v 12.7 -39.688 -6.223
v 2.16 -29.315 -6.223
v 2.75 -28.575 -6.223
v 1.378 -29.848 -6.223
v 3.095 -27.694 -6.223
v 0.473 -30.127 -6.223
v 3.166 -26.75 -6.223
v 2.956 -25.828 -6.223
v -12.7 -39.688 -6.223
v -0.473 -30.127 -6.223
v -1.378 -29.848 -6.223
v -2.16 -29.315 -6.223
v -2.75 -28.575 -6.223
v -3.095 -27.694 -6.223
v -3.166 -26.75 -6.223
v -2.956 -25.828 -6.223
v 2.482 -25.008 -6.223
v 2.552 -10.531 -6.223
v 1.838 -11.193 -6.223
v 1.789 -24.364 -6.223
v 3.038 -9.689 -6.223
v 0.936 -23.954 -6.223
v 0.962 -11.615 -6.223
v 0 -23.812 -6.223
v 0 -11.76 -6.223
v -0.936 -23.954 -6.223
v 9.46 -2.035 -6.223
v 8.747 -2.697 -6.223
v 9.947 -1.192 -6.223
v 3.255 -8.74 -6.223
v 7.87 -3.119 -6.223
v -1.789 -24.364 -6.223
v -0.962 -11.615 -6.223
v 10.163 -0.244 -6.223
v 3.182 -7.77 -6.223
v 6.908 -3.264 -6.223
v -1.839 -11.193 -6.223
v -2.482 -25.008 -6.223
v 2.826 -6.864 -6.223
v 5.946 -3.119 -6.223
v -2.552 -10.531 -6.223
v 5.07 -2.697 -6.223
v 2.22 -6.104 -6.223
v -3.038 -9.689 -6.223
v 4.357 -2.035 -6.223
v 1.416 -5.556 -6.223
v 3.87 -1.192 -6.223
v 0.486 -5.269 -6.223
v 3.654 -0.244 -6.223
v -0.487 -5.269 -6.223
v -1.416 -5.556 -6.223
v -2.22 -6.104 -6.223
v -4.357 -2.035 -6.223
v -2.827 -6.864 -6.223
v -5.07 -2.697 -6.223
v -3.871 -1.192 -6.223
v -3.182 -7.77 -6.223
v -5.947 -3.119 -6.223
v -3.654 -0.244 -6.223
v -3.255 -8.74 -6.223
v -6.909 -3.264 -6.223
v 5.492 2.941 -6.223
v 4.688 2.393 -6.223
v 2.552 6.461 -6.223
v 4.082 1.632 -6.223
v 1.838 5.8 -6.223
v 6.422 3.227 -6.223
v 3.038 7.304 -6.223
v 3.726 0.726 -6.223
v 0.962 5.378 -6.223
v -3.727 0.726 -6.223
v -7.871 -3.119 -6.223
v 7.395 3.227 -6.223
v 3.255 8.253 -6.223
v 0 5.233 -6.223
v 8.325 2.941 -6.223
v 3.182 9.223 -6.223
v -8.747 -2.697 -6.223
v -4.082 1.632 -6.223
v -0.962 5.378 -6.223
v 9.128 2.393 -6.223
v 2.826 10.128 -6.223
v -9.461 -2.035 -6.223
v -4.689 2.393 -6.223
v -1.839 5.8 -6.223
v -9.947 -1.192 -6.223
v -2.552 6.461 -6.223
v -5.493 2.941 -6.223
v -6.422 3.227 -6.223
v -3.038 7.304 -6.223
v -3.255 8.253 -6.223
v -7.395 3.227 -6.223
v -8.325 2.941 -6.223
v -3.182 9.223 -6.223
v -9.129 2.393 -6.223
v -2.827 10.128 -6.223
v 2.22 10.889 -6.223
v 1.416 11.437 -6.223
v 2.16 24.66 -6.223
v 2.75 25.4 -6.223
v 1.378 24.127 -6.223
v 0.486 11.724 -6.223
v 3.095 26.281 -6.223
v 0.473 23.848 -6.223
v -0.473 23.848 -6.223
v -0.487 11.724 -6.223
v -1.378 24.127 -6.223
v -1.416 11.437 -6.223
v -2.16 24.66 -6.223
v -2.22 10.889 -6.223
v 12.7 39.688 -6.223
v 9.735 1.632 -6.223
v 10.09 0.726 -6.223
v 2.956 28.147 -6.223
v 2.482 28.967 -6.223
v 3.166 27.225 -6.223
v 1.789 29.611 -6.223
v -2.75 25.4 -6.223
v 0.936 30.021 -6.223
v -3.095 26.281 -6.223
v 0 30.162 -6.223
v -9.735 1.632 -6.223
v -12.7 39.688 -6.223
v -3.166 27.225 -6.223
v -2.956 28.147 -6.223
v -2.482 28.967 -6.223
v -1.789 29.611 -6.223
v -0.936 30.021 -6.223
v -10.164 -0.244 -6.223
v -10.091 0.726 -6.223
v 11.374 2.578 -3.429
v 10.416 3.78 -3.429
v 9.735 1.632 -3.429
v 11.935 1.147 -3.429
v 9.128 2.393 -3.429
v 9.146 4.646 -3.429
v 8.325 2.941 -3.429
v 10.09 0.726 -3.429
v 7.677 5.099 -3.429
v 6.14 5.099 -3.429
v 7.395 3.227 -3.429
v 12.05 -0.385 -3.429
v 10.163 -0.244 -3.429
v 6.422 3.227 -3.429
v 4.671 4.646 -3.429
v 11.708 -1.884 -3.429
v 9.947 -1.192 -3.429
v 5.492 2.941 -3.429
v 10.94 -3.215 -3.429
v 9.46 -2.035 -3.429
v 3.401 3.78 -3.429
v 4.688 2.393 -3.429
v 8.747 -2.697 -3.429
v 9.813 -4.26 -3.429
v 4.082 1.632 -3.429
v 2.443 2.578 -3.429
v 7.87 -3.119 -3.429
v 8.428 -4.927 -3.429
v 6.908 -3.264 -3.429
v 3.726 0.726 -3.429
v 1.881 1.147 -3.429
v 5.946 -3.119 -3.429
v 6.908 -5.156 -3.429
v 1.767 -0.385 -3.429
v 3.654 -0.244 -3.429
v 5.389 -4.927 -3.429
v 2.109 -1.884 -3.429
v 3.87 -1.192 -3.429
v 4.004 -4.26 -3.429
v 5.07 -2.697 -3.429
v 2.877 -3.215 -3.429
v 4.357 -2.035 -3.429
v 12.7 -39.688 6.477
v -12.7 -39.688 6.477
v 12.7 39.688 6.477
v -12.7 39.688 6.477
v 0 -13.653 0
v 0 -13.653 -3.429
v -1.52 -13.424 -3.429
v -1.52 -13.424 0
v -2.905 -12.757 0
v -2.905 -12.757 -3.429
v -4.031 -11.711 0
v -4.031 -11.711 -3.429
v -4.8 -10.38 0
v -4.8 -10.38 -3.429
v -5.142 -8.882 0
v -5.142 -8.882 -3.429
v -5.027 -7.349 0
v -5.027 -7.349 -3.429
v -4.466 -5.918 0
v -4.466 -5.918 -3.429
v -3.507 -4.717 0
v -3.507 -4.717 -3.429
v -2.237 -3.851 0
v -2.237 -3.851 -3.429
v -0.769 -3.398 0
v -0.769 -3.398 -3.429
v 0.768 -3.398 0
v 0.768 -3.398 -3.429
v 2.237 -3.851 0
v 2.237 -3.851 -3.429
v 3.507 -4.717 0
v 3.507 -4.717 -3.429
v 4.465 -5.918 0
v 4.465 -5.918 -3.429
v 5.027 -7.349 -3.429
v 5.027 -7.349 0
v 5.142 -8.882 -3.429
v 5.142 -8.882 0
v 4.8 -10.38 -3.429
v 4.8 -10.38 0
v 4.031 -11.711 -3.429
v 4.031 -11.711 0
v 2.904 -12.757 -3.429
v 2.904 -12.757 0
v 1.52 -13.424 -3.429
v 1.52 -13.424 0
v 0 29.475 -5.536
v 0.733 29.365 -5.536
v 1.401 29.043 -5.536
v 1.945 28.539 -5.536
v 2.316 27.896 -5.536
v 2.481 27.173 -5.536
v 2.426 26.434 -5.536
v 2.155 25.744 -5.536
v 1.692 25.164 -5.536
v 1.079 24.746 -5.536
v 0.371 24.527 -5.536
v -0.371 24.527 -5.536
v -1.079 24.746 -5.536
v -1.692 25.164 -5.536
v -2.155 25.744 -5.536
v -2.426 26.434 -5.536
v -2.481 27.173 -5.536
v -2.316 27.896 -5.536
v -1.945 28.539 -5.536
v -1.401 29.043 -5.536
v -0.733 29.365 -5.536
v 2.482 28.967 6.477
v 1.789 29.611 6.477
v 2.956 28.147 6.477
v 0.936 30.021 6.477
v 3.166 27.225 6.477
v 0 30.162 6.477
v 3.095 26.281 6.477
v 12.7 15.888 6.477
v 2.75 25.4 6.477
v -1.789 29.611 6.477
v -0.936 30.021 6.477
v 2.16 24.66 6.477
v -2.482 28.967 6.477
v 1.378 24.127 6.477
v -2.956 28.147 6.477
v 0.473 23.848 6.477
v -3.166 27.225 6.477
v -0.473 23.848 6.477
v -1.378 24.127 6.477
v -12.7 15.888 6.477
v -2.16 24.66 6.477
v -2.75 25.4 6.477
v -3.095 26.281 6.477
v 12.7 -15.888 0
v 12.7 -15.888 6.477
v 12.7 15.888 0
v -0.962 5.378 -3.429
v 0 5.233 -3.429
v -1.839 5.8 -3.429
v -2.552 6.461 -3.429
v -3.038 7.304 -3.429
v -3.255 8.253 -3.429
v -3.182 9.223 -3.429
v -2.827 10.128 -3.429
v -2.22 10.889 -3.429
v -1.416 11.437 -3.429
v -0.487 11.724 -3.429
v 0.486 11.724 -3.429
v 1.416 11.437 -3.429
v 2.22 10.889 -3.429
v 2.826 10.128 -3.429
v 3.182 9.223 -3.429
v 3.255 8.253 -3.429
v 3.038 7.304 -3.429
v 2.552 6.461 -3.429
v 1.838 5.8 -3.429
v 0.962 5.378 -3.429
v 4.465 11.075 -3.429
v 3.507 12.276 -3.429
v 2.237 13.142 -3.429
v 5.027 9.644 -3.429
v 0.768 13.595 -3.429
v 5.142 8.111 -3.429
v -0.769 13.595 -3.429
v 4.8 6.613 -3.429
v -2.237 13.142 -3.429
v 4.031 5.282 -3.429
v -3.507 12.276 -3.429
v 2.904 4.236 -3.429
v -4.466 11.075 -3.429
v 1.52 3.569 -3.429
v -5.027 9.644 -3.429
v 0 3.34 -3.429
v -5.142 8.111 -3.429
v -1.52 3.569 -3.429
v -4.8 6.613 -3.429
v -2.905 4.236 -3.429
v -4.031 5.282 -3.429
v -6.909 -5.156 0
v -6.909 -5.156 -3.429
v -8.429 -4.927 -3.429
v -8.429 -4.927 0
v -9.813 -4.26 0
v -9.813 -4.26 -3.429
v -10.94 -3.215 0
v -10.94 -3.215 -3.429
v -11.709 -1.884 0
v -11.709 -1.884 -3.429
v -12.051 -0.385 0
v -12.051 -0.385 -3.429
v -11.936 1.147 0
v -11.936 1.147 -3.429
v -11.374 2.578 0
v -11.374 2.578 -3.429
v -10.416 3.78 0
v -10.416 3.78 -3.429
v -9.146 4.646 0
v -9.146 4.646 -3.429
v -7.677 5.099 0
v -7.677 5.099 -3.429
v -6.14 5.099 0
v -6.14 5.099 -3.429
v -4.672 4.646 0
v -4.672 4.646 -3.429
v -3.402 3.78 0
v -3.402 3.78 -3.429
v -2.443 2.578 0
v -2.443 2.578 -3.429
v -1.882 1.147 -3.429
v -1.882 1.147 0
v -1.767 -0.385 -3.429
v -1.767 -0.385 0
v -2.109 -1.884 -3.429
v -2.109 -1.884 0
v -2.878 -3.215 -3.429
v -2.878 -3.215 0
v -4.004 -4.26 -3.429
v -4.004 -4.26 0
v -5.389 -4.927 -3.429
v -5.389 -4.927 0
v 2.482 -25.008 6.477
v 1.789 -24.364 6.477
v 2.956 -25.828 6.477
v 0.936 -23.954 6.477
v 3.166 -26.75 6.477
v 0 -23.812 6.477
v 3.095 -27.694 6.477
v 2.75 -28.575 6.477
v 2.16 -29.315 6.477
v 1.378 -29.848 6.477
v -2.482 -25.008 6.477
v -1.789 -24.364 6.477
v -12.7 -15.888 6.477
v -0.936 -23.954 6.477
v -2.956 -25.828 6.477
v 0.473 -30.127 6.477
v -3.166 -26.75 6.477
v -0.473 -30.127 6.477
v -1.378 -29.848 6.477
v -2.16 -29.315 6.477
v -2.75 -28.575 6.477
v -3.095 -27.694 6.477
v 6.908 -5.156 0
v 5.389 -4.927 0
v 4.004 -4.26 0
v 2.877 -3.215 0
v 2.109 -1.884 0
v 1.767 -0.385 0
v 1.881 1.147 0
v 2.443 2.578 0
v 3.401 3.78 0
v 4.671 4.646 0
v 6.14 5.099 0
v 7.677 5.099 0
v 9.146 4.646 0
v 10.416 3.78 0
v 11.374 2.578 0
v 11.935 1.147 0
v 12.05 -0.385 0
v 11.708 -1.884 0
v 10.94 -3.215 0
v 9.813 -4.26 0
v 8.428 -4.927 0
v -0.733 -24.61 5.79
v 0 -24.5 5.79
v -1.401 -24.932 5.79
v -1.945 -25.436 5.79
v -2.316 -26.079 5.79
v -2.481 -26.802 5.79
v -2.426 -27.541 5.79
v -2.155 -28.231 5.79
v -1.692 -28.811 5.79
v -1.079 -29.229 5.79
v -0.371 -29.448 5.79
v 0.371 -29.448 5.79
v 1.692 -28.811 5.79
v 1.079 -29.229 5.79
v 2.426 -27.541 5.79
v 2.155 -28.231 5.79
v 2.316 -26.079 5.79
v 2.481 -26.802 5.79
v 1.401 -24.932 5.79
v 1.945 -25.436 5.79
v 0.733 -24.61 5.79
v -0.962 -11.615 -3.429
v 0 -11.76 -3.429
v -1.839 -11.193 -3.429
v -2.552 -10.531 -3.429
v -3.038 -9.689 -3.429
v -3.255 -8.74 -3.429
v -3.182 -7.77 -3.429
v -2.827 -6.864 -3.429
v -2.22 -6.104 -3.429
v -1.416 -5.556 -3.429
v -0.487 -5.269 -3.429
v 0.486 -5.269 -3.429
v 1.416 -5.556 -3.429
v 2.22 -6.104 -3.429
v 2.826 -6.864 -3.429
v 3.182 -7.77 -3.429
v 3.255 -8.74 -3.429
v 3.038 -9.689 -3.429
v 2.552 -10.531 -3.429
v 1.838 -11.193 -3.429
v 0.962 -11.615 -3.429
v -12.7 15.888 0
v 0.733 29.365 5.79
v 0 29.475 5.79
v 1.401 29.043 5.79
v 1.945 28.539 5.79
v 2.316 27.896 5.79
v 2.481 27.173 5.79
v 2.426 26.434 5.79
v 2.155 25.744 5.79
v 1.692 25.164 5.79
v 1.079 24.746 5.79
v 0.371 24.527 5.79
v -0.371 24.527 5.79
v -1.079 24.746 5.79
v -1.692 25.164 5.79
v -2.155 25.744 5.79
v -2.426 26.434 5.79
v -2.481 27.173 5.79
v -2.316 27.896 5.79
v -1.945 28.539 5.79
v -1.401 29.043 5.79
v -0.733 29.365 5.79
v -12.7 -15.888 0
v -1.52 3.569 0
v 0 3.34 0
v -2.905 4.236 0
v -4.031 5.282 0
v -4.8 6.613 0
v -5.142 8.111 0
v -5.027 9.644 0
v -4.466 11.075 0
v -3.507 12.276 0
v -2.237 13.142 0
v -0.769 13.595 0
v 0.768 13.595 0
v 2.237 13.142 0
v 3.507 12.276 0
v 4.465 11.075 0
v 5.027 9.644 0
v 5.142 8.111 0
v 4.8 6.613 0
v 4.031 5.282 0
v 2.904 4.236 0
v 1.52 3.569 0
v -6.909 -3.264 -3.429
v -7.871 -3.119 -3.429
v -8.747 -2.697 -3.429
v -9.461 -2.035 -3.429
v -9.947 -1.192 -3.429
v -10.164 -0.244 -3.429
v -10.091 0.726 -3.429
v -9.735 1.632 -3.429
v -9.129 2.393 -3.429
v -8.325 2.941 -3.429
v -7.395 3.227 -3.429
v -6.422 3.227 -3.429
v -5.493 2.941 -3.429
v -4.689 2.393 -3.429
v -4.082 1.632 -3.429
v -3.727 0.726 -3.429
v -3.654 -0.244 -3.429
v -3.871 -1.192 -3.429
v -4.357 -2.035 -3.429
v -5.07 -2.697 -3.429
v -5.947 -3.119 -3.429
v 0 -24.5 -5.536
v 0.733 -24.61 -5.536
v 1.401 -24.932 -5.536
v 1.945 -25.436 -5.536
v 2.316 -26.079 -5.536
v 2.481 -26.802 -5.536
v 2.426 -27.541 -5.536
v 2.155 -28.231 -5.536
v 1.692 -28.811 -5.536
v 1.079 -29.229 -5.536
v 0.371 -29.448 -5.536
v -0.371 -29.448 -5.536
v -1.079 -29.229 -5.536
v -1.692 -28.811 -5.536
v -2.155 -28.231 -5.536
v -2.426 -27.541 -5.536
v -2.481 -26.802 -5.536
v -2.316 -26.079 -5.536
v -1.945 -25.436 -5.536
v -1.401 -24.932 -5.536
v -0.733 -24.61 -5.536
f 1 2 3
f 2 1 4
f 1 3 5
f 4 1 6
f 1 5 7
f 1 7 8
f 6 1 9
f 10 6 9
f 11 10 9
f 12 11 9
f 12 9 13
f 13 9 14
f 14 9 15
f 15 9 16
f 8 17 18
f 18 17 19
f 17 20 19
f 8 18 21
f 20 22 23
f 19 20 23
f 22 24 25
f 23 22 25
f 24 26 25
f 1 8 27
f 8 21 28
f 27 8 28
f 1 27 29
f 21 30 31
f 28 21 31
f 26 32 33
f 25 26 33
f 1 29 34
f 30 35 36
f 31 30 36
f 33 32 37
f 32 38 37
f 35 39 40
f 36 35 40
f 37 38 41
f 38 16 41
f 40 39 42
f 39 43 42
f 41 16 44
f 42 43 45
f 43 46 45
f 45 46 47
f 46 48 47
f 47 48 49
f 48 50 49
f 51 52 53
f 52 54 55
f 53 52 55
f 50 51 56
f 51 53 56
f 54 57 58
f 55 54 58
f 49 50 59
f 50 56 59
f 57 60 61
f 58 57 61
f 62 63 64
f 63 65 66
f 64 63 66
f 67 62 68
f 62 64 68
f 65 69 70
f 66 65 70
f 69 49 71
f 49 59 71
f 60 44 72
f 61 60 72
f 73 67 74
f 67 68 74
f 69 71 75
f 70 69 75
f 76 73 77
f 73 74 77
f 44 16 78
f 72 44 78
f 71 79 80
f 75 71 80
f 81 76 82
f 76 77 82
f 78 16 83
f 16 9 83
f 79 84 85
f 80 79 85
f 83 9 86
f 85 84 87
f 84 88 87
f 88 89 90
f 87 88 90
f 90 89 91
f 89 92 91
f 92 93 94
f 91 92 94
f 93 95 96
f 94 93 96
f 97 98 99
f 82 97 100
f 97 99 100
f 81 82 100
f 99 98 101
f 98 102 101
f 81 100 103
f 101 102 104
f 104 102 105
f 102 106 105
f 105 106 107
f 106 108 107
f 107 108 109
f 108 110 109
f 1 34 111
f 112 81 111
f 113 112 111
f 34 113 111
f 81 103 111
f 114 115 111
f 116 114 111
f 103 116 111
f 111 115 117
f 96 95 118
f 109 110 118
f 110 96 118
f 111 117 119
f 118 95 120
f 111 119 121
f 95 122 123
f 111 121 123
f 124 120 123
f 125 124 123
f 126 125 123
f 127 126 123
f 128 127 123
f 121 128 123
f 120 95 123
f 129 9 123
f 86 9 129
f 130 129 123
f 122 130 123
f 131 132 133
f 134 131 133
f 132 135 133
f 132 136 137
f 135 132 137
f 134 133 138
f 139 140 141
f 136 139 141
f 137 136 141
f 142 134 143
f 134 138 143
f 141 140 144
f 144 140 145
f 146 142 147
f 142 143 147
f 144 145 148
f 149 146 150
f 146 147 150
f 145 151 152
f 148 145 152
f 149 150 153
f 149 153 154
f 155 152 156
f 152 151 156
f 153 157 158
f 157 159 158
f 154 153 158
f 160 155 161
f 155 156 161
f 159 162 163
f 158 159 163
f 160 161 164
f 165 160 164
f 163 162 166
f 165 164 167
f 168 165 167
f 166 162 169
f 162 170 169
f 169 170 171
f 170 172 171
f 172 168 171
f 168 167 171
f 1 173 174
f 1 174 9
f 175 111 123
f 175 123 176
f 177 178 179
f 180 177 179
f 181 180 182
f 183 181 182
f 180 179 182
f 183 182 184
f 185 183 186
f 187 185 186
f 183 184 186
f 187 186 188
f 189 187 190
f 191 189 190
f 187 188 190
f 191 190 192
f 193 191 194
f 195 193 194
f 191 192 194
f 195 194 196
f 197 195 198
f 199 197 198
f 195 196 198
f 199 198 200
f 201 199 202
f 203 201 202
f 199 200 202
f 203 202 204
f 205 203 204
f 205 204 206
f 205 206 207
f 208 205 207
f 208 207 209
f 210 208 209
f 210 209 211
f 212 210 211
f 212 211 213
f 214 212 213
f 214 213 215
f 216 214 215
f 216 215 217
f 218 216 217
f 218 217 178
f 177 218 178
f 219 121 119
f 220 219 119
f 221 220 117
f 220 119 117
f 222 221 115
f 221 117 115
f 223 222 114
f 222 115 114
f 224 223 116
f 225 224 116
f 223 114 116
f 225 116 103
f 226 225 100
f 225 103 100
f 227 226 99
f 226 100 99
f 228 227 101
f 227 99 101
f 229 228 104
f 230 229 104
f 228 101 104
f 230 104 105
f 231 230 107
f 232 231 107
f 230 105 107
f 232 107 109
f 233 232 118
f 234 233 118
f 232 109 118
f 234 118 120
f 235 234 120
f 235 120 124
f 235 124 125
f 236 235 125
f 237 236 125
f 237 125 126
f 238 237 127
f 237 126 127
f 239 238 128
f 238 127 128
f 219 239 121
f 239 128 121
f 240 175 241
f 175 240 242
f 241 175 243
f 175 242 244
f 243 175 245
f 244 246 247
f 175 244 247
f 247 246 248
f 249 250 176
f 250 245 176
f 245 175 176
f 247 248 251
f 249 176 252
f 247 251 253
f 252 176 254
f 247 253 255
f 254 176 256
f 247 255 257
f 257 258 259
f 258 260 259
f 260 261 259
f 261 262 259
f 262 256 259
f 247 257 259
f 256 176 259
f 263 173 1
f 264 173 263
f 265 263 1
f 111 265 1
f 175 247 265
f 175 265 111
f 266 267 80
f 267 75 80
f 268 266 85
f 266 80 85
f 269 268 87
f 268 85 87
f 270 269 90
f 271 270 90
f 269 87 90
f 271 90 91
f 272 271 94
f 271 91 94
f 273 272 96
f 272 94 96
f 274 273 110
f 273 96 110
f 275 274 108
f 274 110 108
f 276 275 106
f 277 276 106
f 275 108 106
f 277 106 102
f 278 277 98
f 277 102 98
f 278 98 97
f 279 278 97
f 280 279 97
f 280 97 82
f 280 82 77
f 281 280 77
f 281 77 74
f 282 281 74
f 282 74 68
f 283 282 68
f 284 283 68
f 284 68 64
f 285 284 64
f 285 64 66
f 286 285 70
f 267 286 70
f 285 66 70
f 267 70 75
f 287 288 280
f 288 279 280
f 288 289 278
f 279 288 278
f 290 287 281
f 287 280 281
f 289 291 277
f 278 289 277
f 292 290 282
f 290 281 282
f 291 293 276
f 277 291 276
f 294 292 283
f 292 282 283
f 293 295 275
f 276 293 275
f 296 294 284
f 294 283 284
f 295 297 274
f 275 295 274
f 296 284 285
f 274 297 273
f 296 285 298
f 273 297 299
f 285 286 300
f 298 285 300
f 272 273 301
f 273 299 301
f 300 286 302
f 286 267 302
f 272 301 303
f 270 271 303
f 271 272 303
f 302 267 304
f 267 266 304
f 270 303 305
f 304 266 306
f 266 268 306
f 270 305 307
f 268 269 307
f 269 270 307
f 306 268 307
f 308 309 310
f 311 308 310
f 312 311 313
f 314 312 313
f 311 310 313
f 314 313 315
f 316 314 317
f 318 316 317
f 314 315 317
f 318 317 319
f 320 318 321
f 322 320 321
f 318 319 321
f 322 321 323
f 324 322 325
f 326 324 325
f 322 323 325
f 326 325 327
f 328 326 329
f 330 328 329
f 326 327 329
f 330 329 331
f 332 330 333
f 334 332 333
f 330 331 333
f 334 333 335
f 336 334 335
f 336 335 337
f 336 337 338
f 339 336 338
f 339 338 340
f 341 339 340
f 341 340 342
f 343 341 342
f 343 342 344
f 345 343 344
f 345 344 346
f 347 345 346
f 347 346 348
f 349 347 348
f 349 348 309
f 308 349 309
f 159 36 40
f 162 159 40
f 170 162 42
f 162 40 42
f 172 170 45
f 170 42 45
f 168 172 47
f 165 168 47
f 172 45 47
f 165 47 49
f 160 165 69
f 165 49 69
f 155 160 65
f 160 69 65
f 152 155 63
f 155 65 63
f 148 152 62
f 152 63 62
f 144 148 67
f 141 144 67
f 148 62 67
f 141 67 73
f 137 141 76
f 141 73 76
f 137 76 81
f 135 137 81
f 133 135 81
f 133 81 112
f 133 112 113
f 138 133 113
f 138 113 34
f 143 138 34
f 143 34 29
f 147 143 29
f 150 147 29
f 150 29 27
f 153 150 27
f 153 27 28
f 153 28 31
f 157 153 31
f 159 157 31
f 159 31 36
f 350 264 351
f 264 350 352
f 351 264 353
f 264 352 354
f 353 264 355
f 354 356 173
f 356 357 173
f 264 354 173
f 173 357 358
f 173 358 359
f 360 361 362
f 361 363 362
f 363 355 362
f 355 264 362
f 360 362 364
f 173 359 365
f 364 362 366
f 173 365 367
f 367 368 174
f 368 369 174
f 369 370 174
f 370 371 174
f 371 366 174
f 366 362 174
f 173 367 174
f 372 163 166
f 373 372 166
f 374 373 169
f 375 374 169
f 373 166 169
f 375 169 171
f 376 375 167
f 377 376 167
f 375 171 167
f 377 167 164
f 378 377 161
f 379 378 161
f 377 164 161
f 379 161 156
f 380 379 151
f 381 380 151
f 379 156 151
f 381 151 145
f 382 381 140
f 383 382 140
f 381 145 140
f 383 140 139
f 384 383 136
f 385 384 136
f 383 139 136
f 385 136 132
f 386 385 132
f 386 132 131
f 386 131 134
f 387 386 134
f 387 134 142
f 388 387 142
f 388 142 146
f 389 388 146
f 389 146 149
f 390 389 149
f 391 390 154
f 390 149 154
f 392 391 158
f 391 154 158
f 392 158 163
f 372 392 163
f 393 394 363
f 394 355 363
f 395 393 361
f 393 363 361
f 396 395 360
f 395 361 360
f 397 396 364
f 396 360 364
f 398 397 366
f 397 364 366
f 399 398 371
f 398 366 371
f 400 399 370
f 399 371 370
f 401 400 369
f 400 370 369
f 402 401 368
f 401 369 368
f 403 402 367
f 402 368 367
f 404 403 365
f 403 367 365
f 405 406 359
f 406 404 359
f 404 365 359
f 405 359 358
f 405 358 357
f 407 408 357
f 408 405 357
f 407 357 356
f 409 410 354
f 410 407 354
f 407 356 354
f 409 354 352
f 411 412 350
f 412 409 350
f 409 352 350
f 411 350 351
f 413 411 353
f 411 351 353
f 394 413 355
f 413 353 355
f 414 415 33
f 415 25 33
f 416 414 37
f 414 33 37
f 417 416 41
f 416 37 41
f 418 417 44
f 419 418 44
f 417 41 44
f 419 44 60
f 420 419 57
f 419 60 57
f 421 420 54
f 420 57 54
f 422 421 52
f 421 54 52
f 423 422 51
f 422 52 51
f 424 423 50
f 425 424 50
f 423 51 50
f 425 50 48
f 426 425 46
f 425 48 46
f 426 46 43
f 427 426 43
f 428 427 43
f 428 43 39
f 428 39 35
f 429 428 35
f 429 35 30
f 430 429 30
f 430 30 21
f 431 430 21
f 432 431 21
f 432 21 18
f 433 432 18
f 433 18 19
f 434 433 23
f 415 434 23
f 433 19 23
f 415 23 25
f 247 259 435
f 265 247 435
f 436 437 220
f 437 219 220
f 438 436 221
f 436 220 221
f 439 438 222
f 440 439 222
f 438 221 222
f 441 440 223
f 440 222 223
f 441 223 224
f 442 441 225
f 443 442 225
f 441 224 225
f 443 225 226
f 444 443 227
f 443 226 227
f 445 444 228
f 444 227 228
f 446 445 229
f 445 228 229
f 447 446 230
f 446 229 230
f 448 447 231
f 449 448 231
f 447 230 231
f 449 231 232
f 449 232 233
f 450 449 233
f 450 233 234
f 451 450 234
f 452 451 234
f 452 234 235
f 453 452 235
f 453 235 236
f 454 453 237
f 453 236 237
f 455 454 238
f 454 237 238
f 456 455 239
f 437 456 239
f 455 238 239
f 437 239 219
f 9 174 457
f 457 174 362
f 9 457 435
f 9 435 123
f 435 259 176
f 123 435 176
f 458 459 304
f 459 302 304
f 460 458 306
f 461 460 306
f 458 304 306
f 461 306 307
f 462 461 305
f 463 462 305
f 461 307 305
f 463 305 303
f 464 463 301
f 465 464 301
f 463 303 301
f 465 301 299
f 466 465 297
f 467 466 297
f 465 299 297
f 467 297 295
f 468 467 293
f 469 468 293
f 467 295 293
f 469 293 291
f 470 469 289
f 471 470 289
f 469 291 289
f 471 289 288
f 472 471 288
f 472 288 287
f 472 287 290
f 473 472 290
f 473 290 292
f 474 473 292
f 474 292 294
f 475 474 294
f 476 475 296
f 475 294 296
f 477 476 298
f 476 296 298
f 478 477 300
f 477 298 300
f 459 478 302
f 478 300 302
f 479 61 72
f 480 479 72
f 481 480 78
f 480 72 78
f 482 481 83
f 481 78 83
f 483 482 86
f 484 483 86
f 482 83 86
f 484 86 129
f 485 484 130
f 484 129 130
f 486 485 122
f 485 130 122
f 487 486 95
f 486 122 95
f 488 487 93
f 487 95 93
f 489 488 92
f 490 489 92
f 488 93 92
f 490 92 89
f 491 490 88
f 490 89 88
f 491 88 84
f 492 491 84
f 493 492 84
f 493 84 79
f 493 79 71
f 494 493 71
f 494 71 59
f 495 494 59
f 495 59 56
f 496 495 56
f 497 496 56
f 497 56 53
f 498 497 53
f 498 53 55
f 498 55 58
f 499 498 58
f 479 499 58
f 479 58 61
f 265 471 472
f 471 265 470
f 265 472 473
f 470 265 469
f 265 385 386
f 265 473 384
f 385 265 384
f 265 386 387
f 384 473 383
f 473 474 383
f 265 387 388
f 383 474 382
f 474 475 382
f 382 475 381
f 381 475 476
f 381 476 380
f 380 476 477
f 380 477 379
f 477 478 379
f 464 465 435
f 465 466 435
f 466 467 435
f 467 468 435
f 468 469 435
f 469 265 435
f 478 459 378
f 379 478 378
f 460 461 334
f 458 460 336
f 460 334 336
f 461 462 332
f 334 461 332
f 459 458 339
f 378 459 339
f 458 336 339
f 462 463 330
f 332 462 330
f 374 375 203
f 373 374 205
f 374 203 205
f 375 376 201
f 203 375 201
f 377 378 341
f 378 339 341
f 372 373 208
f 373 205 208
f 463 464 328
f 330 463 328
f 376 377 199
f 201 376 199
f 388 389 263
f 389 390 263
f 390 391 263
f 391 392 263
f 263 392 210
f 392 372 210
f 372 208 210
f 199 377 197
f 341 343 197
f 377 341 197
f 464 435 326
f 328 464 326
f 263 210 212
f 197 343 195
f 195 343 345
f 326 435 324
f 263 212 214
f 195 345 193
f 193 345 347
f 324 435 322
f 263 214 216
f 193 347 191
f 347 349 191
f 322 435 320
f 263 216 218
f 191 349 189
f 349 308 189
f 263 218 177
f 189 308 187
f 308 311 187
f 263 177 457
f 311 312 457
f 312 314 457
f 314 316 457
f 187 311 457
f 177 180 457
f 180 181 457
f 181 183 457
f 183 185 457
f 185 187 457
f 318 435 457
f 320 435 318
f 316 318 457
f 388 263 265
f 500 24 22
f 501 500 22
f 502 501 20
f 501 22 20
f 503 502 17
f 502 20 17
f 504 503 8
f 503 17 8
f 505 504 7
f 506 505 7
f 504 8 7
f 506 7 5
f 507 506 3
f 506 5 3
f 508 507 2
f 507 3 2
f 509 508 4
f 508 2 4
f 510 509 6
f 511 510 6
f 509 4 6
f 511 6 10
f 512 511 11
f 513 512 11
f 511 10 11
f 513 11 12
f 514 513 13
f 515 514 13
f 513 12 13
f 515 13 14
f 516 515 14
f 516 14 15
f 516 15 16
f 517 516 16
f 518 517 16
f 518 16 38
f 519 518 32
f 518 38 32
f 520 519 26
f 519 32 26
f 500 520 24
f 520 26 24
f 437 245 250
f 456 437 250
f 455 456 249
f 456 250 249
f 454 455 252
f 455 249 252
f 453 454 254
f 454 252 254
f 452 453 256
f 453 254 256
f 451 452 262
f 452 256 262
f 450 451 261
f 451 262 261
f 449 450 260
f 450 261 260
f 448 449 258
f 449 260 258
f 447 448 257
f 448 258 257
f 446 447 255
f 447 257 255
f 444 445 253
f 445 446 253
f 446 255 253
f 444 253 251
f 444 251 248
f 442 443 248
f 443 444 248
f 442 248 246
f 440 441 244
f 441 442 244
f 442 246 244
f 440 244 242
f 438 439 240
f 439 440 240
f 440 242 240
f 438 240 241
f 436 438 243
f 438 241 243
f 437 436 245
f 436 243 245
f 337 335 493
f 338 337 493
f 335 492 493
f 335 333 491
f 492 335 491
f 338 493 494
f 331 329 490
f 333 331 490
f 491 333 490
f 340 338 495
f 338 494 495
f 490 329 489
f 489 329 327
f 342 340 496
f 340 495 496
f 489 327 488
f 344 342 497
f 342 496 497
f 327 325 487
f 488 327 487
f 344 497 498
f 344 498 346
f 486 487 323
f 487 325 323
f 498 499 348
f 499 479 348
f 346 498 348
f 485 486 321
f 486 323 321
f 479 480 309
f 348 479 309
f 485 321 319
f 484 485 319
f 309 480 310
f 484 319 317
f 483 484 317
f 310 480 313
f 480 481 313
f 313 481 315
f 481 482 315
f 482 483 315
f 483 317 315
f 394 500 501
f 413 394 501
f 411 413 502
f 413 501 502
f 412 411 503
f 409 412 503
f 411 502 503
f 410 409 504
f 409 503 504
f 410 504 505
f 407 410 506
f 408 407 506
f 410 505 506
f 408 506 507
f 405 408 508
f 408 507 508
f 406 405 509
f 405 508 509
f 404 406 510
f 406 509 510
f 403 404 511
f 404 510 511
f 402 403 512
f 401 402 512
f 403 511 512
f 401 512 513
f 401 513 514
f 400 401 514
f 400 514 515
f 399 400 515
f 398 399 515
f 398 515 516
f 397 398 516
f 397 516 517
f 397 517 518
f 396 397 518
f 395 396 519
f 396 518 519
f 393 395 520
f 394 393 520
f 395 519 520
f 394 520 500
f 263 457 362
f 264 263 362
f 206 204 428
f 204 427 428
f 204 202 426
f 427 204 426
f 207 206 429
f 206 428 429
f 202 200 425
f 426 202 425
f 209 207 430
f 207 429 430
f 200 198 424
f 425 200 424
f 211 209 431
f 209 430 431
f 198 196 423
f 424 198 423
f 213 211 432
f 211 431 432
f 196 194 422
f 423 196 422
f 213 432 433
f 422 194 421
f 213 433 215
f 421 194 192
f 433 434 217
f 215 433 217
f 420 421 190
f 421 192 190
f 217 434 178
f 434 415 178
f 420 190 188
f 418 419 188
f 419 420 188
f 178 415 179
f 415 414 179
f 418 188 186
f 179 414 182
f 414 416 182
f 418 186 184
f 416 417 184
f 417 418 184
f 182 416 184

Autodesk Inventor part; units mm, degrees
sketch "Sketch_1" plane through (0, 0, 0) normal (1, 0, 0) x (0, 1, 0)
  line L0 (-15.8877, 6.477) -> (-39.6875, 6.477)
  line L1 (-39.6875, 6.477) -> (-39.6875, -6.223)
  line L2 (-39.6875, -6.223) -> (39.6875, -6.223)
  line L3 (39.6875, -6.223) -> (39.6875, 6.477)
  line L4 (39.6875, 6.477) -> (15.8877, 6.477)
  line L5 (15.8877, 6.477) -> (15.8877, 0)
  line L6 (15.8877, 0) -> (-15.8877, 0)
  line L7 (-15.8877, 0) -> (-15.8877, 6.477)
extrude "Extrusion1" add sketch "Sketch_1" along normal mid plane 25.4
sketch "Sketch_2" plane through (0, 0, 0) normal (1, 0, 0) x (0, 1, 0)
  line L0 (26.9875, -6.223) -> (26.9875, 6.477)
  line L1 (26.9875, 6.477) -> (30.1625, 6.477)
  line L2 (30.1625, 6.477) -> (29.4754, 5.7899)
  line L3 (29.4754, 5.7899) -> (29.4754, -5.5359)
  line L4 (29.4754, -5.5359) -> (30.1625, -6.223)
  line L5 (30.1625, -6.223) -> (26.9875, -6.223)
  line L6 (26.9875, -6.223) -> (26.9875, 6.477)
revolve "Revolution1" cut sketch "Sketch_2" angle 360 about axis through (0, 26.9875, -6.223) along (0, 0, -1)
thread "Thread1" size "1/4-20 UNC" class "2B" standard "ANSI Unified Screw Threads" full length
sketch "Sketch_3" plane through (0, 0, 0) normal (1, 0, 0) x (0, 1, 0)
  line L0 (-26.9875, -6.223) -> (-26.9875, 6.477)
  line L1 (-26.9875, 6.477) -> (-23.8125, 6.477)
  line L2 (-23.8125, 6.477) -> (-24.4996, 5.7899)
  line L3 (-24.4996, 5.7899) -> (-24.4996, -5.5359)
  line L4 (-24.4996, -5.5359) -> (-23.8125, -6.223)
  line L5 (-23.8125, -6.223) -> (-26.9875, -6.223)
  line L6 (-26.9875, -6.223) -> (-26.9875, 6.477)
revolve "Revolution2" cut sketch "Sketch_3" angle 360 about axis through (0, -26.9875, -6.223) along (0, 0, -1)
thread "Thread2" size "1/4-20 UNC" class "2B" standard "ANSI Unified Screw Threads" full length
sketch "Sketch4" plane through (-12.7, -15.8877, 0) normal (0, 0, 1) x (1, 0, 0)
  point P0 (5.7912, 15.8877)
hole "Hole1" at (-6.9088, 0, 0) direction (0, 0, -1) diameter 6.5278 depth 6.223 counterbore diameter 10.3124 counterbore depth 3.429
pattern_linear "Rectangular Pattern1" count 2 spacing 10.9507 along (0.6309, 0.7759, 0) count 2 spacing 10.9507 along (0.6309, -0.7759, 0) of "Hole1"
ref_plane "screw1_XY" through (-6.9088, 0, -3.429) normal (0, 0, 1) x (1, 0, 0)
ref_plane "screw1_YZ" through (-6.9088, 0, -3.429) normal (1, 0, 0) x (0, 1, 0)
ref_plane "screw1_ZX" through (-6.9088, 0, -3.429) normal (0, 1, 0) x (0, 0, 1)
ref_plane "screw1_1_XY" through (0, 8.4963, -3.429) normal (0, 0, 1) x (1, 0, 0)
ref_plane "screw1_1_YZ" through (0, 8.4963, -3.429) normal (1, 0, 0) x (0, 1, 0)
ref_plane "screw1_1_ZX" through (0, 8.4963, -3.429) normal (0, 1, 0) x (0, 0, 1)
ref_plane "screw2_XY" through (6.9088, 0, -3.429) normal (0, 0, 1) x (1, 0, 0)
ref_plane "screw2_YZ" through (6.9088, 0, -3.429) normal (1, 0, 0) x (0, 1, 0)
ref_plane "screw2_ZX" through (6.9088, 0, -3.429) normal (0, 1, 0) x (0, 0, 1)
ref_plane "screw2_1_XY" through (0, -8.4963, -3.429) normal (0, 0, 1) x (1, 0, 0)
ref_plane "screw2_1_YZ" through (0, -8.4963, -3.429) normal (1, 0, 0) x (0, 1, 0)
ref_plane "screw2_1_ZX" through (0, -8.4963, -3.429) normal (0, 1, 0) x (0, 0, 1)
ref_plane "to_dummy_XY" through (0, 0, -6.223) normal (0, 0, 1) x (1, 0, 0)
ref_plane "to_dummy_YZ" through (0, 0, -6.223) normal (1, 0, 0) x (0, 1, 0)
ref_plane "to_dummy_ZX" through (0, 0, -6.223) normal (0, 1, 0) x (0, 0, 1)
ref_plane "to_screw1_XY" through (0, 26.9875, 6.477) normal (0, 0, 1) x (1, 0, 0)
ref_plane "to_screw1_YZ" through (0, 26.9875, 6.477) normal (1, 0, 0) x (0, 1, 0)
ref_plane "to_screw1_ZX" through (0, 26.9875, 6.477) normal (0, 1, 0) x (0, 0, 1)
ref_plane "to_screw2_XY" through (0, -26.9875, 6.477) normal (0, 0, 1) x (1, 0, 0)
ref_plane "to_screw2_YZ" through (0, -26.9875, 6.477) normal (1, 0, 0) x (0, 1, 0)
ref_plane "to_screw2_ZX" through (0, -26.9875, 6.477) normal (0, 1, 0) x (0, 0, 1)
properties part number "2750-1_b"
